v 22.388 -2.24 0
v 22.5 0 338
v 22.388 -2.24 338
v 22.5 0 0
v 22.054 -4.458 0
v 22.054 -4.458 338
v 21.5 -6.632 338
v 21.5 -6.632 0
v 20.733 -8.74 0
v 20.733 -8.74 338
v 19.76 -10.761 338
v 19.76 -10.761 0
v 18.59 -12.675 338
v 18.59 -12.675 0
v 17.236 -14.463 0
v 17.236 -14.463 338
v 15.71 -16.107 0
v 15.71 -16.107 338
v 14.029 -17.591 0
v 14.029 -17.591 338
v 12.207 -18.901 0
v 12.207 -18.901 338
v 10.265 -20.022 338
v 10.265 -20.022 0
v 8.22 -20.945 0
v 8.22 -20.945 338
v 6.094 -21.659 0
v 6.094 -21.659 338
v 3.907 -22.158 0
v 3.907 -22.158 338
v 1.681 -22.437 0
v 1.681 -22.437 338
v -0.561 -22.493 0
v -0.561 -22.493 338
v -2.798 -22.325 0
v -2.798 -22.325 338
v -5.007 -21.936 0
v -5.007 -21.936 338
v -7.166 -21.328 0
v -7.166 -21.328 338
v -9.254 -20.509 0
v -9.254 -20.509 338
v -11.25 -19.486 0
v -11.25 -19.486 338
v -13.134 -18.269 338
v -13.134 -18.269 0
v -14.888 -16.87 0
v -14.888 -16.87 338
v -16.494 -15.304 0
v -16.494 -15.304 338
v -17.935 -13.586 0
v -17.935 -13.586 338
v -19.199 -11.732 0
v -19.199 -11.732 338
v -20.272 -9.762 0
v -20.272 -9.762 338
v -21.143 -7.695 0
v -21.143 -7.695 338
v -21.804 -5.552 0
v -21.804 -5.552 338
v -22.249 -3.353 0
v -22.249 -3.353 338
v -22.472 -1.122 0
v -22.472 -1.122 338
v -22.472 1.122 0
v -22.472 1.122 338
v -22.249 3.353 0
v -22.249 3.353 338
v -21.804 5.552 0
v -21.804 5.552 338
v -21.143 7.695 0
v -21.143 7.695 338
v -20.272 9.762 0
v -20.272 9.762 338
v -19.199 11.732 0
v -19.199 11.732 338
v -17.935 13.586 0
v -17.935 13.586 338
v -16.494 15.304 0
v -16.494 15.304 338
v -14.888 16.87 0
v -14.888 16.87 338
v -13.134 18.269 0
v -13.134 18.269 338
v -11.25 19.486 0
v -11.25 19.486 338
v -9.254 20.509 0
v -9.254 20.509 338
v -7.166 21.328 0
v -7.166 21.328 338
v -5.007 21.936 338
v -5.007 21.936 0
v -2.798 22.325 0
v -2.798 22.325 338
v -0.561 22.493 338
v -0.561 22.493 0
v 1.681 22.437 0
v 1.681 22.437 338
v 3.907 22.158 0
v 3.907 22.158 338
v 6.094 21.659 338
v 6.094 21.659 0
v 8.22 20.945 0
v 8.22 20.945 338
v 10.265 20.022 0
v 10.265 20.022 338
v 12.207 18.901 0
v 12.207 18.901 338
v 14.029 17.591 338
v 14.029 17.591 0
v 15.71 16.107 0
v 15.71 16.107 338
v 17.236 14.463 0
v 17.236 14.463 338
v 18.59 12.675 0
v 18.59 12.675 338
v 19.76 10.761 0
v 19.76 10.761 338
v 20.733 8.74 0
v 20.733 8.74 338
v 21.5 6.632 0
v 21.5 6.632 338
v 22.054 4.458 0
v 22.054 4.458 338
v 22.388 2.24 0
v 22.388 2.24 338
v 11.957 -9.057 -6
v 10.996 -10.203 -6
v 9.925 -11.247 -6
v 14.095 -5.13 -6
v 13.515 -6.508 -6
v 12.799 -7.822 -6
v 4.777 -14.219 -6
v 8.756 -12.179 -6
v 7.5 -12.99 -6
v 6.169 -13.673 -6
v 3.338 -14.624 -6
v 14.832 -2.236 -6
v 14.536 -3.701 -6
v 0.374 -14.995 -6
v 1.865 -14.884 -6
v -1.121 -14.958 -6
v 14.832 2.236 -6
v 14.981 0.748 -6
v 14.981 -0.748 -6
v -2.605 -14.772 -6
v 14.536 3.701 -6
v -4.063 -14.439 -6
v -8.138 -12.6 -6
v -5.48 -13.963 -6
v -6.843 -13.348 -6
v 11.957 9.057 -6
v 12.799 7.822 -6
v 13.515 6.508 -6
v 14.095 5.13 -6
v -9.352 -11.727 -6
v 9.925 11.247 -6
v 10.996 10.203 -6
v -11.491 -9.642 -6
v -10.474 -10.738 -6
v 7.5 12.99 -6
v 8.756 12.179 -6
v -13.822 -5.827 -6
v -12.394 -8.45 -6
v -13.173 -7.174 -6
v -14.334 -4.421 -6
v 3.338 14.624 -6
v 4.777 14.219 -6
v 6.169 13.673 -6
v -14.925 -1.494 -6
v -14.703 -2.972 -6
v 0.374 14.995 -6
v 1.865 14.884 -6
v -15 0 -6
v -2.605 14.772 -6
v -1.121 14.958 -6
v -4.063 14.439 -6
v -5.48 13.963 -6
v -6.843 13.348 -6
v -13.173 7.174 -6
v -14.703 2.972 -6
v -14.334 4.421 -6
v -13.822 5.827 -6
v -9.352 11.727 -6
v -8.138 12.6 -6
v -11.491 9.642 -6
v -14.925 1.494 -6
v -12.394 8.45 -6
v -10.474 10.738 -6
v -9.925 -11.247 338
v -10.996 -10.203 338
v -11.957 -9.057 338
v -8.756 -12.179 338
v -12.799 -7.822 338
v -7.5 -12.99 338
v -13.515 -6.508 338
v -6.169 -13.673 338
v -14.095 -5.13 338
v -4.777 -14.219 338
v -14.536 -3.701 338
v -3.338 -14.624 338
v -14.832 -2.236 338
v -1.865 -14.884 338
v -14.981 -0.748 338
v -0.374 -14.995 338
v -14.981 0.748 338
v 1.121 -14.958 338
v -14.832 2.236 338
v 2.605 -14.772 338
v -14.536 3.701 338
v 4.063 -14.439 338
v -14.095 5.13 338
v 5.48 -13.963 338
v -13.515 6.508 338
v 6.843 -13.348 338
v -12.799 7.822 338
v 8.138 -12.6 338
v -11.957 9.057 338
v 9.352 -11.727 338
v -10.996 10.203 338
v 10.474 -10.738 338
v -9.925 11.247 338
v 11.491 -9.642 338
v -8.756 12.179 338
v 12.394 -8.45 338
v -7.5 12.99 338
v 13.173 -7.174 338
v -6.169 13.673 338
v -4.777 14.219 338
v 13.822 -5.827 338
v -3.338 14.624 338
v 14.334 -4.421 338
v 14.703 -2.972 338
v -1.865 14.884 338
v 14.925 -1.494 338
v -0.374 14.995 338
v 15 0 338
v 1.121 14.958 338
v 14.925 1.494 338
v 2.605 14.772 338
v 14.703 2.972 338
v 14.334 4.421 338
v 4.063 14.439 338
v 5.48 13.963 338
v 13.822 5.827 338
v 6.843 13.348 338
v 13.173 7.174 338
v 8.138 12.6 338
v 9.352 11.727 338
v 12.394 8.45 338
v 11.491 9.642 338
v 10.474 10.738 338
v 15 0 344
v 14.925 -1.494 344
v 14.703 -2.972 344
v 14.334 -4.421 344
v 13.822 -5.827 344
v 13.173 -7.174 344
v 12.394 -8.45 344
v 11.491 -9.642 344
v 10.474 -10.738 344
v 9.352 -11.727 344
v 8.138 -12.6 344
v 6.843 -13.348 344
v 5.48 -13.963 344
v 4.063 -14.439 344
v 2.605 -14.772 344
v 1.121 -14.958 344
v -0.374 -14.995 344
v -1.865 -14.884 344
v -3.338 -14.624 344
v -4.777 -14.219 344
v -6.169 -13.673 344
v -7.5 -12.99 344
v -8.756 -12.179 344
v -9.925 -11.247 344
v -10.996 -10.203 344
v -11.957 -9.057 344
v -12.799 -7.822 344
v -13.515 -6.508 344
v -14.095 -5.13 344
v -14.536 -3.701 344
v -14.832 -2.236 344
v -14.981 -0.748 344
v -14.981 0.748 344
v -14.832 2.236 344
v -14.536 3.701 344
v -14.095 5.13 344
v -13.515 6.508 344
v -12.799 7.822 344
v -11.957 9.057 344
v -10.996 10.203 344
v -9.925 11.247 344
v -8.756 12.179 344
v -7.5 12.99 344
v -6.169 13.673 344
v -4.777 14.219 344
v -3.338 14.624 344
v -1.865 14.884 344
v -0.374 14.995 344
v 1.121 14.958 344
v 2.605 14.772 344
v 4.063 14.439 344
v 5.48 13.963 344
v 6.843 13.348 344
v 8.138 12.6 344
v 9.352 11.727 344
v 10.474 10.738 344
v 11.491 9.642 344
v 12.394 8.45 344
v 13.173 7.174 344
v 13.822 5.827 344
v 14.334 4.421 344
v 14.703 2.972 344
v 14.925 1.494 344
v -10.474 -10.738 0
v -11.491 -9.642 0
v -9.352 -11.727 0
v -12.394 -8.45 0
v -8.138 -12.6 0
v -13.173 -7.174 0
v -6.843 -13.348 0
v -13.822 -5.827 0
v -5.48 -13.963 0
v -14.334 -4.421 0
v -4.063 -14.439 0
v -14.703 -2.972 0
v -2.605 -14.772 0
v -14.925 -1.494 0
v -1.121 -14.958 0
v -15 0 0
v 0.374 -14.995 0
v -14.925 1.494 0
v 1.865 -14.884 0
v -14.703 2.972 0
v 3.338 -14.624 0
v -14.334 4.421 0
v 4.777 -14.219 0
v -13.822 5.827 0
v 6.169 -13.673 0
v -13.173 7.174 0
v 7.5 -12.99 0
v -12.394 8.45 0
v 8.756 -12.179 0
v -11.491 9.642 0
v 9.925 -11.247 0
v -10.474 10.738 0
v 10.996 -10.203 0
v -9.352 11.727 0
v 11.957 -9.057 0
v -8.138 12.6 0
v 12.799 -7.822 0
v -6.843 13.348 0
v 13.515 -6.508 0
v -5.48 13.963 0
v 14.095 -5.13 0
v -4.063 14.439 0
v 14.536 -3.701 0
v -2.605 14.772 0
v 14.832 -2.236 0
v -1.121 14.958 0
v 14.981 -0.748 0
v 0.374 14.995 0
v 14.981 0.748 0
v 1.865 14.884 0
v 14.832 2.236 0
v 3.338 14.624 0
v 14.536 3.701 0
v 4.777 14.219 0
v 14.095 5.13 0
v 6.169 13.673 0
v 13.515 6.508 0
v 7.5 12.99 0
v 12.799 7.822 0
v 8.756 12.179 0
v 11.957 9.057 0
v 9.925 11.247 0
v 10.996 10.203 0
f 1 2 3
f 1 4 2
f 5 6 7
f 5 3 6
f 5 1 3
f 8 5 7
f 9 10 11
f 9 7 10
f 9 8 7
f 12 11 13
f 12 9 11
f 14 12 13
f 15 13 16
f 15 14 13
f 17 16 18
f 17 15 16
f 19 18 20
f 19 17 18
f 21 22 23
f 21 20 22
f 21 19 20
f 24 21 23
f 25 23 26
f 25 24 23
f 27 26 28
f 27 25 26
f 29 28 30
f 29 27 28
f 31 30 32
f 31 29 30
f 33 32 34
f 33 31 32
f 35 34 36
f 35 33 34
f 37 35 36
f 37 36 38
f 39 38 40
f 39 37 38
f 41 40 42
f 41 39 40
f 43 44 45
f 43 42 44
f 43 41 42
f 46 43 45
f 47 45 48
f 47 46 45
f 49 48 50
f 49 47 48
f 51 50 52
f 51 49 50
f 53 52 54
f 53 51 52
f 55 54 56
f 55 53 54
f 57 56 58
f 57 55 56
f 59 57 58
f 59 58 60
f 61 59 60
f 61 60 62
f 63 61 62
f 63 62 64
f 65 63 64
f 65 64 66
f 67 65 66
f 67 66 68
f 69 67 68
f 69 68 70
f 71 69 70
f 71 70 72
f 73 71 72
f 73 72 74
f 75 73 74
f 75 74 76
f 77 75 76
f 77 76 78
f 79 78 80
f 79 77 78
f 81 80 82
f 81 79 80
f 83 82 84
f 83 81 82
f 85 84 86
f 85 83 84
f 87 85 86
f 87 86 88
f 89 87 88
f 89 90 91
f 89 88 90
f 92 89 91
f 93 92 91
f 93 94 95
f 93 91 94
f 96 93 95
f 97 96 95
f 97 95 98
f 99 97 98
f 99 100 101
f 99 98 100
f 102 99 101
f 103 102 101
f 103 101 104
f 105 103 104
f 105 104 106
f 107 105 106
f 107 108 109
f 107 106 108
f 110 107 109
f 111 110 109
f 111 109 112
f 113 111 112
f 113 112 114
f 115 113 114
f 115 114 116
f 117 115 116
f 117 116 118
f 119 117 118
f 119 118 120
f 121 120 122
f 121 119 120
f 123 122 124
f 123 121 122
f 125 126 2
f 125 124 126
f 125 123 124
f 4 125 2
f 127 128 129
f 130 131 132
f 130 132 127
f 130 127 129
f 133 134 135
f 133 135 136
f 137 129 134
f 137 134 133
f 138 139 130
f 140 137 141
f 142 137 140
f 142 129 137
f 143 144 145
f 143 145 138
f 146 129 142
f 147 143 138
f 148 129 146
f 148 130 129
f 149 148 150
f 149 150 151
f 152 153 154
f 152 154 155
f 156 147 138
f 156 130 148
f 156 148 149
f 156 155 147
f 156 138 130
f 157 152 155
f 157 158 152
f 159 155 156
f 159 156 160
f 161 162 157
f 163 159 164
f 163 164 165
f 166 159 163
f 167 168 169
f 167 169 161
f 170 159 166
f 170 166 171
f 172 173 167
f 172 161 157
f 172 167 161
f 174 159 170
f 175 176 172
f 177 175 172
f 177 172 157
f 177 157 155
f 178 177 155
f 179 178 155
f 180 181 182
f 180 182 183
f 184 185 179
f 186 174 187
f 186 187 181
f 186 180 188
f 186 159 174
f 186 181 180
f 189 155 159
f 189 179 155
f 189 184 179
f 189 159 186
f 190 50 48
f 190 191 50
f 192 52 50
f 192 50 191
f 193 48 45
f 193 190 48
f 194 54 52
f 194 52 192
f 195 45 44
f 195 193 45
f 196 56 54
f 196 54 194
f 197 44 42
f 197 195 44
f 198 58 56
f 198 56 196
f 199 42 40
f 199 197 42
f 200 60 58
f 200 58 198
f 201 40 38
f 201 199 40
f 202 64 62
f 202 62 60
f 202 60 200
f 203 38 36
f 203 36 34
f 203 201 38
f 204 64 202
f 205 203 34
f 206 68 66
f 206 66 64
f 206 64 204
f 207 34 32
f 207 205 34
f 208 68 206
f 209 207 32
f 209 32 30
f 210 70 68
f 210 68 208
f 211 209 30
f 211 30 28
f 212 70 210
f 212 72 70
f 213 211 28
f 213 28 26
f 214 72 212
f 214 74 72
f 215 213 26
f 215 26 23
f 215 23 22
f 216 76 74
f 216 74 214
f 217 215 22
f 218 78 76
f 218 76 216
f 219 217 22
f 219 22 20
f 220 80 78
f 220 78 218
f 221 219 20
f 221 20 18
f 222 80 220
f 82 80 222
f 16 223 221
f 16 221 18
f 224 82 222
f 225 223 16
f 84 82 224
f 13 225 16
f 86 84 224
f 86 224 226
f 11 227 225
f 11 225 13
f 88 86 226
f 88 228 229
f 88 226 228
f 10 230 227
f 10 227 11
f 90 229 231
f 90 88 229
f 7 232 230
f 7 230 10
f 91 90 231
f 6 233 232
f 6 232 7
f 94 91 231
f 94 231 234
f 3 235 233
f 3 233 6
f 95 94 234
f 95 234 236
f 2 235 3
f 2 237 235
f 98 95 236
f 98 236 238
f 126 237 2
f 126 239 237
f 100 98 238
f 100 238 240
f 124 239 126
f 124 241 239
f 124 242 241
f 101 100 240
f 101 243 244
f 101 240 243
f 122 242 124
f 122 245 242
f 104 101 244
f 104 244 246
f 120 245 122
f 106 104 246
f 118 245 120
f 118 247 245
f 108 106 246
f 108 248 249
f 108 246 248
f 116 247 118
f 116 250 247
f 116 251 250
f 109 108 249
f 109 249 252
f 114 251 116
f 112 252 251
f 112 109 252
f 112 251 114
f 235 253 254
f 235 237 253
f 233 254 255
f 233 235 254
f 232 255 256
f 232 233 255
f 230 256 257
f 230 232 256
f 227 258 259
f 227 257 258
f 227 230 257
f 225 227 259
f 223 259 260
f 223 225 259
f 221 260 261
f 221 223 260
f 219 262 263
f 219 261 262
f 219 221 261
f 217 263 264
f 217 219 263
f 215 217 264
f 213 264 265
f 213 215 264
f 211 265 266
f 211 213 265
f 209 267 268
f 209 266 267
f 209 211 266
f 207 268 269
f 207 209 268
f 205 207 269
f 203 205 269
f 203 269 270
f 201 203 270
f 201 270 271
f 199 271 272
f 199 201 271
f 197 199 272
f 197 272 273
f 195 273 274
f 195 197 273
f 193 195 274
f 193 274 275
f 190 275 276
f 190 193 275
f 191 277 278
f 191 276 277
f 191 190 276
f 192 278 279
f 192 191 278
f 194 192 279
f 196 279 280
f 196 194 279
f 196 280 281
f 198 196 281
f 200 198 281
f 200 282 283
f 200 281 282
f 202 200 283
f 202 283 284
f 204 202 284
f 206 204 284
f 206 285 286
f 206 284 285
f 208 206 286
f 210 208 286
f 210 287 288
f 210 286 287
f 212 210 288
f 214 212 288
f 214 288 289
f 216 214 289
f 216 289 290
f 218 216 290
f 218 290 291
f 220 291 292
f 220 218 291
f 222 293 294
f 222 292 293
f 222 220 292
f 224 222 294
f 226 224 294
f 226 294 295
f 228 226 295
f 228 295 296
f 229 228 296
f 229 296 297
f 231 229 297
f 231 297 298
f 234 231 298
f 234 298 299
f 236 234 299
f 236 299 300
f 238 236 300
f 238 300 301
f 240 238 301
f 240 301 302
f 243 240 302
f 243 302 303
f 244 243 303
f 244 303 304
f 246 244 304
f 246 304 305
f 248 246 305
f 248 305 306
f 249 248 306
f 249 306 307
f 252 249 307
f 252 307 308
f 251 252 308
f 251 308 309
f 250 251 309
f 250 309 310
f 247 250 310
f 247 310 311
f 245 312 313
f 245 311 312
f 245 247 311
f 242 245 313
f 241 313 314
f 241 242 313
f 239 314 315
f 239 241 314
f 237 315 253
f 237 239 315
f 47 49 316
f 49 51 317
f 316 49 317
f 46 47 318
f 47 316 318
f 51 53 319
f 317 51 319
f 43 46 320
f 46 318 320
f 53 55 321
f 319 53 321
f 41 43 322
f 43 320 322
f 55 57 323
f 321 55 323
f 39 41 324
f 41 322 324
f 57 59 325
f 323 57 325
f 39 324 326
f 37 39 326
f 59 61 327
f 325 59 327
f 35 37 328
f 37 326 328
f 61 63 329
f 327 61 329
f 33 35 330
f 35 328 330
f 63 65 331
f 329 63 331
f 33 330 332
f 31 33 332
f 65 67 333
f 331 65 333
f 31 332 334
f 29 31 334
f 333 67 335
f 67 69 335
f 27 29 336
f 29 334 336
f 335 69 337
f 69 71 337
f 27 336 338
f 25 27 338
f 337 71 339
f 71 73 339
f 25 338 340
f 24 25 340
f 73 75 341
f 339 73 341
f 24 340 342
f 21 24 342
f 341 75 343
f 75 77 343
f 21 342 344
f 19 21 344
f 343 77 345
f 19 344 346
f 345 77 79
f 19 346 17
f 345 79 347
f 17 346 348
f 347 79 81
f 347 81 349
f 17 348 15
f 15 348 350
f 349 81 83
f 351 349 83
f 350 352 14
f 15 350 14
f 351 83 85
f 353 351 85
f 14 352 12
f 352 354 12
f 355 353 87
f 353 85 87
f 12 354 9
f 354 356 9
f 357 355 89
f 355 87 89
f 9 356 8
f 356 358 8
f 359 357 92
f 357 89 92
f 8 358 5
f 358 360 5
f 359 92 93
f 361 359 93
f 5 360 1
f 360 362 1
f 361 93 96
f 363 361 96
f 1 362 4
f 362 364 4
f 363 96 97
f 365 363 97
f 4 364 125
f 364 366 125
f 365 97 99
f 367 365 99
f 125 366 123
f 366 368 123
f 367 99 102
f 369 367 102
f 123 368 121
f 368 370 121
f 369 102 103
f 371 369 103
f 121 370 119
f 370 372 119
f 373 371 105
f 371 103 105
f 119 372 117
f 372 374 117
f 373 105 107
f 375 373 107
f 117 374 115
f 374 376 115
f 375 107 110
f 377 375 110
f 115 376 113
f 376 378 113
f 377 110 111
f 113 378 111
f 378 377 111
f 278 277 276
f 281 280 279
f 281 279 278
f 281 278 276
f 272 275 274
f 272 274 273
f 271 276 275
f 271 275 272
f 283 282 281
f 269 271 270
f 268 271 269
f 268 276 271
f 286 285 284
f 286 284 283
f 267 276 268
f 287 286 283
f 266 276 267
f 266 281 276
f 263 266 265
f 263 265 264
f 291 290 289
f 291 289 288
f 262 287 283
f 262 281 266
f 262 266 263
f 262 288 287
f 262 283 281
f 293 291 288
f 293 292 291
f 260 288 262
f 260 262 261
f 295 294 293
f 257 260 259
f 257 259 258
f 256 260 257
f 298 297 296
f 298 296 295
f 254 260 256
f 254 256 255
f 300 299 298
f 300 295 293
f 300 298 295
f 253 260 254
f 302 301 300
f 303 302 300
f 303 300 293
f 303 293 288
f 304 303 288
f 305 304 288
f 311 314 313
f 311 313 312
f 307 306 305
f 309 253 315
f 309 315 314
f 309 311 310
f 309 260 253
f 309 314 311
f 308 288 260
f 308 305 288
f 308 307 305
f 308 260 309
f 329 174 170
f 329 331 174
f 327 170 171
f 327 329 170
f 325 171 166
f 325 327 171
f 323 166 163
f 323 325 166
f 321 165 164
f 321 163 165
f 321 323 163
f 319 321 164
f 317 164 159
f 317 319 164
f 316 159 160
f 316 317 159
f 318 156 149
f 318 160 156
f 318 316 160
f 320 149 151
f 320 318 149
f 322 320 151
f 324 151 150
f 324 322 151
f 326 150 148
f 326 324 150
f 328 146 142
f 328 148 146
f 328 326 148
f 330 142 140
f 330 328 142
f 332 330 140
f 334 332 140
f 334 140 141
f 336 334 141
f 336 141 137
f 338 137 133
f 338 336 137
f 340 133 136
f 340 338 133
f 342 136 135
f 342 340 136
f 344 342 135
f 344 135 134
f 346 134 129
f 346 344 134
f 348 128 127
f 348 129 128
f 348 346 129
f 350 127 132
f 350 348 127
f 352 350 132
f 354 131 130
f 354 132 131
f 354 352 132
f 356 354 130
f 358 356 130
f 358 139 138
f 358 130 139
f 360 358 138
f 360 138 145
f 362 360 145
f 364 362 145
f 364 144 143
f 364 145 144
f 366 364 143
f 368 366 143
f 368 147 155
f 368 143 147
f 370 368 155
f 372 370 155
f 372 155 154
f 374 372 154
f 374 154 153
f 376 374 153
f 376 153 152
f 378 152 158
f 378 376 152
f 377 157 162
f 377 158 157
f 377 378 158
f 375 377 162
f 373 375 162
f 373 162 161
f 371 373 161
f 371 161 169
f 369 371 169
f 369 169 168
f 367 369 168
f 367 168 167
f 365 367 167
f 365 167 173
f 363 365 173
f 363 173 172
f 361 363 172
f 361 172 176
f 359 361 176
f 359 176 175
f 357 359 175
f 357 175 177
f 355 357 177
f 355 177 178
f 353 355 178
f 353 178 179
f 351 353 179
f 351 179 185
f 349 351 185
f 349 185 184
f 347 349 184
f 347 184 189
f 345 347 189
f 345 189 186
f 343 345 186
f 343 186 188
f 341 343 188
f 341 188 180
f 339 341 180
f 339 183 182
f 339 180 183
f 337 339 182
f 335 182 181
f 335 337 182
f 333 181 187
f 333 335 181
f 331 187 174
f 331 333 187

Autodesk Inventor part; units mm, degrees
ref_plane "YZ Plane" through (0, 0, 0) normal (1, 0, 0) x (0, 1, 0)
ref_plane "XZ Plane" through (0, 0, 0) normal (0, 1, 0) x (-1, 0, 0)
ref_plane "XY Plane" through (0, 0, 0) normal (0, 0, 1) x (1, 0, 0)
sketch "Skizze1" plane through (0, 0, 0) normal (0, 0, 1) x (1, 0, 0)
  circle A0 centre (0, 0) radius 22.5
  dimension "d0" = 45
extrude "Extrusion1" add sketch "Skizze1" along normal blind 338
sketch "Skizze2" plane through (0, 0, 338) normal (0, 0, 1) x (1, 0, 0)
  point P0 (0, 0)
sketch "Skizze3" plane through (0, 0, 338) normal (0, 0, 1) x (1, 0, 0)
  circle A0 centre (0, 0) radius 15
  dimension "d3" = 30
extrude "Extrusion2" add sketch "Skizze3" along normal blind 6
sketch "Skizze4" plane through (0, 0, 0) normal (0, 0, -1) x (-1, 0, 0)
  circle A0 centre (0, 0) radius 15
extrude "Extrusion3" add sketch "Skizze4" along normal blind 6
properties part number "Welle"
